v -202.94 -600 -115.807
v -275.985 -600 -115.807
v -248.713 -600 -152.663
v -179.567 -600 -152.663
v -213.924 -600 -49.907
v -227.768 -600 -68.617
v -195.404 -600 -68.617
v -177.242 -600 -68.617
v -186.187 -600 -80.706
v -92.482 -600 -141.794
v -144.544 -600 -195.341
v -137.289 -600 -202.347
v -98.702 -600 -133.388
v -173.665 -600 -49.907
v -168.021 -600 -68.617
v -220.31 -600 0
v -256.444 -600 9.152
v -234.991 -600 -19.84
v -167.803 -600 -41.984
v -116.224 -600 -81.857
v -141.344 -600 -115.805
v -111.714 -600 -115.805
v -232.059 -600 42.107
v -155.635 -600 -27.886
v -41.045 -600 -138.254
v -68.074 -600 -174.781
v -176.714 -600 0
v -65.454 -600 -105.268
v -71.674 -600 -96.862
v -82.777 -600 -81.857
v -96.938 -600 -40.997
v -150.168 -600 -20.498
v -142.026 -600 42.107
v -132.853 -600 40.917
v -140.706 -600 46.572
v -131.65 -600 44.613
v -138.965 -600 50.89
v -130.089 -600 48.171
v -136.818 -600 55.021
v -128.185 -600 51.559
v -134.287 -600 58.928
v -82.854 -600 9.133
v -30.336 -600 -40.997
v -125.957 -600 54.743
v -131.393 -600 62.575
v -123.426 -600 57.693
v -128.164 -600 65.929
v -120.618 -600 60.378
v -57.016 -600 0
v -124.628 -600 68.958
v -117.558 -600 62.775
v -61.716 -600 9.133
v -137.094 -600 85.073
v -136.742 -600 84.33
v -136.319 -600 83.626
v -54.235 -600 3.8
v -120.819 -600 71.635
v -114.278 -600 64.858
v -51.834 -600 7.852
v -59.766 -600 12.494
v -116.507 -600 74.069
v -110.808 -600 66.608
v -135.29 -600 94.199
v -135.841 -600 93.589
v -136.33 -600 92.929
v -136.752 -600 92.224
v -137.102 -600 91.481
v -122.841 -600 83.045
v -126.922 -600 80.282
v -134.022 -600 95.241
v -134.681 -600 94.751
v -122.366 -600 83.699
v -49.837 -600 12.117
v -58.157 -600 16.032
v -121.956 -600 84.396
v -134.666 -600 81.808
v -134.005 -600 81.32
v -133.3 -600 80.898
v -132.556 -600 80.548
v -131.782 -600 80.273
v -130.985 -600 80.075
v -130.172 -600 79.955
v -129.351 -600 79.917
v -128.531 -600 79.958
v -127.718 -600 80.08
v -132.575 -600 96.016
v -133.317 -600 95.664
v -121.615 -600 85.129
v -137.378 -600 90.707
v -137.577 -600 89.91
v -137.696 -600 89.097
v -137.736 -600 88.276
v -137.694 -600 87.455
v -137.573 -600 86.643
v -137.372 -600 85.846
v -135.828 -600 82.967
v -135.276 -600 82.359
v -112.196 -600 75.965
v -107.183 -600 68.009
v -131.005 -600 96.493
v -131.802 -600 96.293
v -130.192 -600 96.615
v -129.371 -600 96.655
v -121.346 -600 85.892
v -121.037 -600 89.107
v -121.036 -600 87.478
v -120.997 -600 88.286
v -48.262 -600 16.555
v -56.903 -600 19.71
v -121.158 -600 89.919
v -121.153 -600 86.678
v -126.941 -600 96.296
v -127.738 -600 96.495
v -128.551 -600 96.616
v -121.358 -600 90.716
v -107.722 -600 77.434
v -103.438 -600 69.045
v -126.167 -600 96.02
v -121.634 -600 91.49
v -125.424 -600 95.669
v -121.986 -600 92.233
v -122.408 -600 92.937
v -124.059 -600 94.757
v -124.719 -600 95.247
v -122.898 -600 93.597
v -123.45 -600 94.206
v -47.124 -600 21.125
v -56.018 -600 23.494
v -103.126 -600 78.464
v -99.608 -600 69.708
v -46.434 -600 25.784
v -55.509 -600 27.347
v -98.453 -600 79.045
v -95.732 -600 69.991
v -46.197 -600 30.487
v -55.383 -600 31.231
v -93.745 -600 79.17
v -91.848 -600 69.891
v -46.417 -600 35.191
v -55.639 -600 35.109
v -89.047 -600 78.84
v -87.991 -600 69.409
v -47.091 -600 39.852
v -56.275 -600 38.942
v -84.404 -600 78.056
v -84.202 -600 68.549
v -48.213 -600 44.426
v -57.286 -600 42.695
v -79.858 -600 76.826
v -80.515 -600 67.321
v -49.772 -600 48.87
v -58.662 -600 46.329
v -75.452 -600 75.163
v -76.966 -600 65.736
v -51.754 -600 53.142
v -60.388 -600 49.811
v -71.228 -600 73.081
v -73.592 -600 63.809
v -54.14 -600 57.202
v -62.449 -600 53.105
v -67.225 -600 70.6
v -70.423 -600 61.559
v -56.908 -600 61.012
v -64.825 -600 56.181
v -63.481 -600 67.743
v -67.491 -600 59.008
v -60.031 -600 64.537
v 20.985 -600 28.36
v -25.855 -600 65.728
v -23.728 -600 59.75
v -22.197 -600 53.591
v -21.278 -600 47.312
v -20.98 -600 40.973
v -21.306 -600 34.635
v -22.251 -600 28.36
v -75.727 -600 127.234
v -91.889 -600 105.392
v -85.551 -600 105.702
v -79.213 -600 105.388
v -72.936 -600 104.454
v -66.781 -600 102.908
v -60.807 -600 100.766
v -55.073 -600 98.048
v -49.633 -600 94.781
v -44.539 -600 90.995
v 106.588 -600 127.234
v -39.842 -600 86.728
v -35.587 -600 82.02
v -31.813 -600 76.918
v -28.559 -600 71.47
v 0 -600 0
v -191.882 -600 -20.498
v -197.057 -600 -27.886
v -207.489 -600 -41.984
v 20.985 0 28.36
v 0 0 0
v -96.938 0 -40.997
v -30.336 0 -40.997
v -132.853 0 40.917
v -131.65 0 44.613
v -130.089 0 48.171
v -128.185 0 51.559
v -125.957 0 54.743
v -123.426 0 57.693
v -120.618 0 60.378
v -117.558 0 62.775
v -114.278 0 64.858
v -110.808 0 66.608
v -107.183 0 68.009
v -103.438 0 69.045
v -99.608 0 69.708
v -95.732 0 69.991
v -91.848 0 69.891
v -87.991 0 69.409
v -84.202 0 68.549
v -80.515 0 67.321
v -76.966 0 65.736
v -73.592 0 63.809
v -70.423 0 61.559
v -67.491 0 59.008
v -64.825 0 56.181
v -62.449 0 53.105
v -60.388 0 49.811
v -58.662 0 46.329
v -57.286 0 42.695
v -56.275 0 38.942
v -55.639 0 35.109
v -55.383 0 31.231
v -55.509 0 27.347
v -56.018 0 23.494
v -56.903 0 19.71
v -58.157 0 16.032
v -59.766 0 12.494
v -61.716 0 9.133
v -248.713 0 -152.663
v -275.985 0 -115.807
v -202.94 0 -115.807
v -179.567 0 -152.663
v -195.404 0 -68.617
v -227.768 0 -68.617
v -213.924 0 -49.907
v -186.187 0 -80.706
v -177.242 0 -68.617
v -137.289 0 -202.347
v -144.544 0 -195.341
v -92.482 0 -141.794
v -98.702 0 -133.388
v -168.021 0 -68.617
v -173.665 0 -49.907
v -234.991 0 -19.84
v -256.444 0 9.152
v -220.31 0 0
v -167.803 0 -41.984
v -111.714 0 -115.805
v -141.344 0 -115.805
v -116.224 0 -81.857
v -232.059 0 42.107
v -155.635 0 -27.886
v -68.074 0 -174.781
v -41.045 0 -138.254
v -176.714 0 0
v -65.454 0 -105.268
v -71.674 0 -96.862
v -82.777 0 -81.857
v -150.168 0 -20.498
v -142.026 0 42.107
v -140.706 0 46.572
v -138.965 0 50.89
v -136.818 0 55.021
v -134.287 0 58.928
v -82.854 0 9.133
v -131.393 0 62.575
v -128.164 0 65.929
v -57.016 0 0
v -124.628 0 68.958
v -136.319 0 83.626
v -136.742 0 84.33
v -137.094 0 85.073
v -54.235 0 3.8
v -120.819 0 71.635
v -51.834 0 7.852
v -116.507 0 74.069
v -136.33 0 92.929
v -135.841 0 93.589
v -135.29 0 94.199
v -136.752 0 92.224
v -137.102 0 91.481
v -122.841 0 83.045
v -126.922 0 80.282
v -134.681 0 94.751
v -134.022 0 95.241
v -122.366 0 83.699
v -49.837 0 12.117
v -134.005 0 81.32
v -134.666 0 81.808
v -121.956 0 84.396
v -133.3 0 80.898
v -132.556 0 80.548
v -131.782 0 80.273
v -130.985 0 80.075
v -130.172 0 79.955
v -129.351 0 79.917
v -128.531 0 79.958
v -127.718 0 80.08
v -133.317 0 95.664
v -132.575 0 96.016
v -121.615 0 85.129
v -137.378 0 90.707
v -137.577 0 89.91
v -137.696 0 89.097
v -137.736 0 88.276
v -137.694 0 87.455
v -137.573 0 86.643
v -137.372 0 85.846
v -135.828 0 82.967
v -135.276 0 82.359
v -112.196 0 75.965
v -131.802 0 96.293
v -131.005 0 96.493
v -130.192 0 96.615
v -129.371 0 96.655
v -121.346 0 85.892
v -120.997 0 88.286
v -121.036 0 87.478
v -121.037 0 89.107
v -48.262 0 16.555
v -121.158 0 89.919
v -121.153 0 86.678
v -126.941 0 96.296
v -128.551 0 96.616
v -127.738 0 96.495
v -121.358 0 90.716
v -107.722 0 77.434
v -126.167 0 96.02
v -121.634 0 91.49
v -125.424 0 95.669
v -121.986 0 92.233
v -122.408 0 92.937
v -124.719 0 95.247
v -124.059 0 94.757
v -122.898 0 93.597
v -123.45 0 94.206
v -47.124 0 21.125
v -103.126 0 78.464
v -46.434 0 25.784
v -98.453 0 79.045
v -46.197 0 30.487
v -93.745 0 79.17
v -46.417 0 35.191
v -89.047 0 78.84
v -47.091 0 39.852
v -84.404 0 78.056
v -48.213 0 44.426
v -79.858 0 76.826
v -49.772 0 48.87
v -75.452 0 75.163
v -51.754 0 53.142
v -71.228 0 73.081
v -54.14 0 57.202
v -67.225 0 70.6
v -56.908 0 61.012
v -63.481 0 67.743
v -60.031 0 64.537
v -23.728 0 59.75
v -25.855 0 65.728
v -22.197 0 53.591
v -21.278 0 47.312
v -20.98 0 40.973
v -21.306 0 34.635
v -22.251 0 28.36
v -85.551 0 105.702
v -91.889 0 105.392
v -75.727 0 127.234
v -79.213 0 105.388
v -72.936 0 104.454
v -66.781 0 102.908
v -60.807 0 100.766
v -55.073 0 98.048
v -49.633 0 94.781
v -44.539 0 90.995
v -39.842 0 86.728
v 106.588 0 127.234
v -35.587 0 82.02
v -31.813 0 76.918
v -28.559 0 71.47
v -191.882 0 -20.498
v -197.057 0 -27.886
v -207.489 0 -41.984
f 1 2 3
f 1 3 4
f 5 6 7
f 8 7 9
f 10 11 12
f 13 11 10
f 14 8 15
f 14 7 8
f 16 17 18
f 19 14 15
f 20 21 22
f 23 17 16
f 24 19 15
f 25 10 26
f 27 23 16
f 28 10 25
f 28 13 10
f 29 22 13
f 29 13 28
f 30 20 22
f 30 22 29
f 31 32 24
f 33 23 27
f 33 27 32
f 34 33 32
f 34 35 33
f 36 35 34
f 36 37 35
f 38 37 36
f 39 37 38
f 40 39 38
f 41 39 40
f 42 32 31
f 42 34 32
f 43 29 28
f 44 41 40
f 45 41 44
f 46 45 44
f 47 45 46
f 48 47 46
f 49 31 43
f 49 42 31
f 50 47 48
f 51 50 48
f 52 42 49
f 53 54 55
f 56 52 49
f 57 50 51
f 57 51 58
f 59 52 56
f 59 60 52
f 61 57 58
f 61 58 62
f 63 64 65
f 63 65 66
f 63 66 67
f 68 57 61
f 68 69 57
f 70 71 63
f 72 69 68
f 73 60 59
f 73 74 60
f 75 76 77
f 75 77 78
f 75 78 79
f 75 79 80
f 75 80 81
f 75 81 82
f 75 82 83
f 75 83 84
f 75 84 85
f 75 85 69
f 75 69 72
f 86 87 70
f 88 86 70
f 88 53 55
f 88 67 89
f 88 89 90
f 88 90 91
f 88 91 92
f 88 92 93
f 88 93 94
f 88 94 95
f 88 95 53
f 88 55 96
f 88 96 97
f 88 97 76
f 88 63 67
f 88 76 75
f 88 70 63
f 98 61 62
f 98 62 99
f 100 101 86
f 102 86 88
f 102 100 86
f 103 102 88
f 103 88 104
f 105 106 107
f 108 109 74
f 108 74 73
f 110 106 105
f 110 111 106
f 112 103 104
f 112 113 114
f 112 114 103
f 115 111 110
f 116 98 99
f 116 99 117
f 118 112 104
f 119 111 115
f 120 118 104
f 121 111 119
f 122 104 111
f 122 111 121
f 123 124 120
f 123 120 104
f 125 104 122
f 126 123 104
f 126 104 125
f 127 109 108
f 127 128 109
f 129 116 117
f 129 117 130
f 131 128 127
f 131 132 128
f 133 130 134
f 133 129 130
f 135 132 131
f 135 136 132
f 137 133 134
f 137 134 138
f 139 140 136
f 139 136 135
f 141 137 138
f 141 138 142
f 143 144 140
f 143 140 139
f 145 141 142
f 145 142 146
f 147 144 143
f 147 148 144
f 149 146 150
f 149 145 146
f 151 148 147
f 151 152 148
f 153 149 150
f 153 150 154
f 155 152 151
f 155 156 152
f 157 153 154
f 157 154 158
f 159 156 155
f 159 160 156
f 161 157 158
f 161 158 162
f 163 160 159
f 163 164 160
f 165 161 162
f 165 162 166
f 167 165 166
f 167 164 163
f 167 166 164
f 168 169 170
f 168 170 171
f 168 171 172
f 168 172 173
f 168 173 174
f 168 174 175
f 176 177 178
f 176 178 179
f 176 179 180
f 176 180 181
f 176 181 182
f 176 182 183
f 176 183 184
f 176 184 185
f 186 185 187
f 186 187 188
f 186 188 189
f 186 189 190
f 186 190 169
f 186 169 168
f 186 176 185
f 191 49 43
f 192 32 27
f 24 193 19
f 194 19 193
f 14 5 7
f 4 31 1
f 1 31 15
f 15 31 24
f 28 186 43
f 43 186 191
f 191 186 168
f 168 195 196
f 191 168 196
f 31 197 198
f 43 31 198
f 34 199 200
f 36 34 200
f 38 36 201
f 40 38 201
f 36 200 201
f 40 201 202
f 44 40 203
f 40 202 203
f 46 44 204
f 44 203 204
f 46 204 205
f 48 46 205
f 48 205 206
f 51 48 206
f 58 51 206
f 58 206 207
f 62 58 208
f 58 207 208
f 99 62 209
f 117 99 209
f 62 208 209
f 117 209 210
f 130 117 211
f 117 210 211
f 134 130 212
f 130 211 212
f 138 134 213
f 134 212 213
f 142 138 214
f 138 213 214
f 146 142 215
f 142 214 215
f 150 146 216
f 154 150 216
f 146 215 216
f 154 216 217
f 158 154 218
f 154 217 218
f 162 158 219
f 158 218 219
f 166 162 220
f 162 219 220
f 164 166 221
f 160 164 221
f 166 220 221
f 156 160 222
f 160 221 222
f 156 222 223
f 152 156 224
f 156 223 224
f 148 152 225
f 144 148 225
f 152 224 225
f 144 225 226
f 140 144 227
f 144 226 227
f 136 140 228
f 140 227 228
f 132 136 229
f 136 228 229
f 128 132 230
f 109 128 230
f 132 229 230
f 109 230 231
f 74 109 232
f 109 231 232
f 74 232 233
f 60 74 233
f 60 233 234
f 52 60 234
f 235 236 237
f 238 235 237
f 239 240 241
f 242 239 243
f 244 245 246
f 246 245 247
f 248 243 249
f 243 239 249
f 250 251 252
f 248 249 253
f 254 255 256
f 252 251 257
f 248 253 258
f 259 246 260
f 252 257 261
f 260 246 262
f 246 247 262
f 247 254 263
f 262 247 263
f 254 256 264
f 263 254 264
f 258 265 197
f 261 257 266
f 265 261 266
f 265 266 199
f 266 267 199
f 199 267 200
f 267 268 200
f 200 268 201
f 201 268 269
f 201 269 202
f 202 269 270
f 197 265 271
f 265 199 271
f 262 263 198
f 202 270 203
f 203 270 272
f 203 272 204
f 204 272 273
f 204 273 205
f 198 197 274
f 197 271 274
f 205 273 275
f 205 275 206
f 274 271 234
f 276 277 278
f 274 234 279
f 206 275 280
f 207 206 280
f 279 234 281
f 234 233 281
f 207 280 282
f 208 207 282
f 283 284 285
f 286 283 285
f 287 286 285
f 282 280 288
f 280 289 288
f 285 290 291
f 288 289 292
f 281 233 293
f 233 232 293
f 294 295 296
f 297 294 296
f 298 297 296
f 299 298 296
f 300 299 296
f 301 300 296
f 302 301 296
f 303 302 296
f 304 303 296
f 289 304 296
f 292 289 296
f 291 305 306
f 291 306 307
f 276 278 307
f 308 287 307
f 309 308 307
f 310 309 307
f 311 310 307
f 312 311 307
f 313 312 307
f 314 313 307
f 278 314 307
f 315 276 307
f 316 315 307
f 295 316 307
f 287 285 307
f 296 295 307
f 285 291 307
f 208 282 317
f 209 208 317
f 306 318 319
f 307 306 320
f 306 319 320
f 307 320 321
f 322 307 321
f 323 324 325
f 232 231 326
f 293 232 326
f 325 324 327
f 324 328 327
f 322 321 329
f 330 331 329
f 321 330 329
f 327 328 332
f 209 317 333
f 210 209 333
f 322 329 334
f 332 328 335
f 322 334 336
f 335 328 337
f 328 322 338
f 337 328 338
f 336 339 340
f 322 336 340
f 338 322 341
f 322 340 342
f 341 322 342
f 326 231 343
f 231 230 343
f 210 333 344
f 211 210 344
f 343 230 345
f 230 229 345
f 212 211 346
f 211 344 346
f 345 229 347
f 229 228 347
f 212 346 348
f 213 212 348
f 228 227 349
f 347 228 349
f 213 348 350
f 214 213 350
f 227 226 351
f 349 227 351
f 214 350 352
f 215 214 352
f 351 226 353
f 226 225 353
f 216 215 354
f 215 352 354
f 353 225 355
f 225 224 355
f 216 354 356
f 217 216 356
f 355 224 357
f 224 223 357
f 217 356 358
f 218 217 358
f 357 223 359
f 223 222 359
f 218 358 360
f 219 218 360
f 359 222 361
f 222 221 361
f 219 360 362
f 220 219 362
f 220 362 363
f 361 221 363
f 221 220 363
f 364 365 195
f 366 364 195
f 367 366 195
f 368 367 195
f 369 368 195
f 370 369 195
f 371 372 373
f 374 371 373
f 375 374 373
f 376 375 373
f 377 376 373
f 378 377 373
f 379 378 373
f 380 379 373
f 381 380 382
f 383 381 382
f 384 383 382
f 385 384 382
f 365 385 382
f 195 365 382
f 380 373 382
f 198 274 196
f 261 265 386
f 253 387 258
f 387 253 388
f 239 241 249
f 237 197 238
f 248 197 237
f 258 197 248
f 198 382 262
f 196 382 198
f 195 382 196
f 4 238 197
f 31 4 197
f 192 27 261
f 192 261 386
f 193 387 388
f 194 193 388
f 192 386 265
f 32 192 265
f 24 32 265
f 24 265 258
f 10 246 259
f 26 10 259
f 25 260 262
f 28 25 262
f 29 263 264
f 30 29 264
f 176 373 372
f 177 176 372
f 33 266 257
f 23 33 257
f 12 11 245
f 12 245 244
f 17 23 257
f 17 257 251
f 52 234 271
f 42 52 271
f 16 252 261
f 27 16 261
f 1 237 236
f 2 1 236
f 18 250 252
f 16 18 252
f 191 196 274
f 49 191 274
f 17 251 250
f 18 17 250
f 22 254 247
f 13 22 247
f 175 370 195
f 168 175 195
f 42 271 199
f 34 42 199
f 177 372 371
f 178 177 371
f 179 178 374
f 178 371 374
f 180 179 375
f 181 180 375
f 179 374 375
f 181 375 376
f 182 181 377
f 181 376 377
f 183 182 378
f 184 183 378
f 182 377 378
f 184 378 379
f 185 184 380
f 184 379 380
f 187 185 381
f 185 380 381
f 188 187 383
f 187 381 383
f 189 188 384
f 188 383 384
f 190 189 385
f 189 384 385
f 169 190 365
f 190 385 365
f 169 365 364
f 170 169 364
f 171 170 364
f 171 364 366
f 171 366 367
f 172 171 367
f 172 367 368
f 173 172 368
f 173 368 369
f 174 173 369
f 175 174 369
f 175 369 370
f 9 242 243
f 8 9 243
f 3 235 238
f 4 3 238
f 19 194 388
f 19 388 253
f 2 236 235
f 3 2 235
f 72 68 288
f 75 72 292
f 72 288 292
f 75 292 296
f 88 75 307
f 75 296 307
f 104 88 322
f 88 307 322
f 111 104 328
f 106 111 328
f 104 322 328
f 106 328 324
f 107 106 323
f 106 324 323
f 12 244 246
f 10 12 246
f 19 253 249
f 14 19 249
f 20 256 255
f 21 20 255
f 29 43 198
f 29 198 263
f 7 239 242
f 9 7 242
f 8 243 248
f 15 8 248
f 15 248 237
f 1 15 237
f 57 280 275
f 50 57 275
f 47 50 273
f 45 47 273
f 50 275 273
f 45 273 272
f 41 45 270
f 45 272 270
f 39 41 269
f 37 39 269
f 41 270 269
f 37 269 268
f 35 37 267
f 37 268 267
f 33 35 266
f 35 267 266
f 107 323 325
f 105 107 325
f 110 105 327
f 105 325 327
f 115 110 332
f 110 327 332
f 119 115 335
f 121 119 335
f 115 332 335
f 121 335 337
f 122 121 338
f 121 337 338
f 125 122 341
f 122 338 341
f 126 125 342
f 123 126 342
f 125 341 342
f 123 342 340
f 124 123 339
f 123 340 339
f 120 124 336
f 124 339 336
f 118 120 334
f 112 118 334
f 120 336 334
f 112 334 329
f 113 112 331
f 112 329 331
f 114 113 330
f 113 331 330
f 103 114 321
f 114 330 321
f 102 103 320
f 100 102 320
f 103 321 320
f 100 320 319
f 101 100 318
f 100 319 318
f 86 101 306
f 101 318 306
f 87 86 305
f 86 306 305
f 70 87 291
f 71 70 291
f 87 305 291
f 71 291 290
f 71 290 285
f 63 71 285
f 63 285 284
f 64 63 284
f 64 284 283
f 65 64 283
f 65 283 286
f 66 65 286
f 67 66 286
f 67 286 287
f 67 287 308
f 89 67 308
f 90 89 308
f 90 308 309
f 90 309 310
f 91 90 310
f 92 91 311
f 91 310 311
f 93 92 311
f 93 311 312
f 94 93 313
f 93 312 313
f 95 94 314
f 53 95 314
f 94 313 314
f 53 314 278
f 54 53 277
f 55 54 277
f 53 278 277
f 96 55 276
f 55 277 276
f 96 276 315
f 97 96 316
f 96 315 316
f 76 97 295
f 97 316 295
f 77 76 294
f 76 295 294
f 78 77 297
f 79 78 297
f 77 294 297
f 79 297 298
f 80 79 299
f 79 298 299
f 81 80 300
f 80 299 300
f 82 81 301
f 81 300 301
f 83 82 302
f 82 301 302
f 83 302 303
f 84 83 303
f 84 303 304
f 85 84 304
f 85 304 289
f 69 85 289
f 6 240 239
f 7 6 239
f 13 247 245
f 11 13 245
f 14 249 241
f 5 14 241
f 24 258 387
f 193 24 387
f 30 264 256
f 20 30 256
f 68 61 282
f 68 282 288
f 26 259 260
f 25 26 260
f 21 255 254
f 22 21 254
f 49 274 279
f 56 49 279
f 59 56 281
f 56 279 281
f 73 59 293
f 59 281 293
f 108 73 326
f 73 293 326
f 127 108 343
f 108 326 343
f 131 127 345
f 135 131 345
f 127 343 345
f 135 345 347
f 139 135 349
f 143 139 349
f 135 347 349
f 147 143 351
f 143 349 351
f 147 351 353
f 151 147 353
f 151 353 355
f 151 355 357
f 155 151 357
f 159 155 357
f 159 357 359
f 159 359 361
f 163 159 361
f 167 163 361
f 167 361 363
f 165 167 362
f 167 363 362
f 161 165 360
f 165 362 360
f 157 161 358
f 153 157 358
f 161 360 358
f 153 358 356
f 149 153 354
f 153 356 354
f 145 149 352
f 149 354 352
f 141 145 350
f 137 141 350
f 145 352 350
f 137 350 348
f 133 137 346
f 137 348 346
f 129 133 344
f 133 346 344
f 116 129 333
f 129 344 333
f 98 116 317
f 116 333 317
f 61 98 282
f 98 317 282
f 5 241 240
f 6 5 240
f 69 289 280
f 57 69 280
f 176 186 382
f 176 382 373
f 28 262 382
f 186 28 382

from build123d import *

# Parameters (mm, degrees)
F1_DEPTH = 600


with BuildPart() as f1:
    # F0 (on Front) → F1 (new body)
    with BuildSketch(Plane.XZ):
        Polygon((-57.0161717128, 0), (-135, 0), (-150.1679810622, -20.4983499457), (-155.6347784559, -27.8863026074), (-165.3359621243, -40.9966998915), (-96.9383139207, -40.9966998915), (-30.3359621243, -40.9966998915), (0, 0), align=None)
        with BuildLine():
            Line((-150.1679810622, -20.4983499457), (-135, 0))
            Line((-135, 0), (-57.0161717128, 0))
            ThreePointArc((-57.0161717128, 0), (-56.9075739834, 61.0124300524), (-116.5067681147, 74.0686344498))
            ThreePointArc((-116.5067681147, 74.0686344498), (-118.6940510107, 72.9068001121), (-120.8193157857, 71.6350630594))
            ThreePointArc((-120.8193157857, 71.6350630594), (-134.2868225707, 58.9282400507), (-142.0255883167, 42.1071641426))
            Line((-142.0255883167, 42.1071641426), (-232.0590932336, 42.1071641426))
            Line((-232.0590932336, 42.1071641426), (-256.4444055904, 9.1523058673))
            Line((-256.4444055904, 9.1523058673), (-234.9909992313, -19.8403088568))
            Line((-234.9909992313, -19.8403088568), (-220.3099429607, 0))
            Line((-220.3099429607, 0), (-176.7144793644, 0))
            Line((-176.7144793644, 0), (-191.8824604265, -20.4983499457))
            Line((-191.8824604265, -20.4983499457), (-150.1679810622, -20.4983499457))
        make_face()
        with BuildLine():
            ThreePointArc((-132.8527878768, 40.9173611322), (-78.7209860622, 66.5720298878), (-61.7161940581, 9.132922604))
            Line((-61.7161940581, 9.132922604), (-82.854176665, 9.132922604))
            Line((-82.854176665, 9.132922604), (-132.8527878768, 40.9173611322))
        make_face(mode=Mode.SUBTRACT)
        Polygon((20.9851757958, 28.3598374347), (0, 0), (-30.3359621243, -40.9966998915), (-71.6739757792, -96.8618190849), (-65.4539629325, -105.2676840103), (106.5884042597, 127.2342312906), (94.1483785662, 127.2342312906), align=None)
        with BuildLine():
            ThreePointArc((-120.8193157857, 71.6350630594), (-118.6940510107, 72.9068001121), (-116.5067681147, 74.0686344498))
            Line((-116.5067681147, 74.0686344498), (-122.841415611, 83.044531927))
            ThreePointArc((-122.841415611, 83.044531927), (-124.6735165199, 81.3559804602), (-126.9215099137, 80.2815850499))
            Line((-126.9215099137, 80.2815850499), (-120.8193157857, 71.6350630594))
        make_face()
        Polygon((-165.3359621243, -40.9966998915), (-155.6347784559, -27.8863026074), (-197.0568264004, -27.8863026074), (-207.4885144694, -41.9839199295), (-167.8028032048, -41.9839199295), (-173.6653593057, -49.906709788), (-213.9235590781, -49.906709788), (-227.7684772045, -68.6170427956), (-195.4038739204, -68.6170427956), (-177.2415726766, -68.6170427956), (-168.0213273478, -68.6170427956), (-202.9398083687, -115.8066615462), (-275.9852580547, -115.8066615462), (-248.7127541929, -152.6633352041), (-179.5672774315, -152.6633352041), (-96.9383139207, -40.9966998915), align=None)
        with BuildLine():
            Line((-22.2512632608, 28.3598374347), (20.9851757958, 28.3598374347))
            Line((20.9851757958, 28.3598374347), (94.1483785662, 127.2342312906))
            Line((94.1483785662, 127.2342312906), (-75.7271274924, 127.2342312906))
            Line((-75.7271274924, 127.2342312906), (-91.8894008887, 105.3921723746))
            ThreePointArc((-91.8894008887, 105.3921723746), (-37.6565854676, 84.4262603806), (-22.2512632608, 28.3598374347))
        make_face()
        with BuildLine():
            ThreePointArc((-126.9215099137, 80.2815850499), (-124.6735165199, 81.3559804602), (-122.841415611, 83.044531927))
            ThreePointArc((-122.841415611, 83.044531927), (-121.4714983754, 85.5077083569), (-120.9969189392, 88.285960634))
            ThreePointArc((-120.9969189392, 88.285960634), (-136.093489638, 93.26518765), (-126.9215099137, 80.2815850499))
        make_face()
        Polygon((-65.4539629325, -105.2676840103), (-71.6739757792, -96.8618190849), (-98.7022470538, -133.3884313442), (-92.4822342071, -141.7942962696), align=None)
        Polygon((-98.7022470538, -133.3884313442), (-71.6739757792, -96.8618190849), (-82.7770473941, -81.8568789745), (-116.2240564073, -81.8568789745), (-141.3440536534, -115.804606894), (-111.7135926971, -115.804606894), align=None)
        Polygon((-92.4822342071, -141.7942962696), (-98.7022470538, -133.3884313442), (-144.5443985877, -195.3405435308), (-137.2889383083, -202.3470815625), align=None)
        Polygon((-41.0452445793, -138.2541736742), (-65.4539629325, -105.2676840103), (-92.4822342071, -141.7942962696), (-68.0735158539, -174.7807859336), align=None)
        Polygon((-177.2415726766, -68.6170427956), (-195.4038739204, -68.6170427956), (-186.1869692802, -80.7060524821), align=None)
    extrude(amount=F1_DEPTH)


solid = f1.part
